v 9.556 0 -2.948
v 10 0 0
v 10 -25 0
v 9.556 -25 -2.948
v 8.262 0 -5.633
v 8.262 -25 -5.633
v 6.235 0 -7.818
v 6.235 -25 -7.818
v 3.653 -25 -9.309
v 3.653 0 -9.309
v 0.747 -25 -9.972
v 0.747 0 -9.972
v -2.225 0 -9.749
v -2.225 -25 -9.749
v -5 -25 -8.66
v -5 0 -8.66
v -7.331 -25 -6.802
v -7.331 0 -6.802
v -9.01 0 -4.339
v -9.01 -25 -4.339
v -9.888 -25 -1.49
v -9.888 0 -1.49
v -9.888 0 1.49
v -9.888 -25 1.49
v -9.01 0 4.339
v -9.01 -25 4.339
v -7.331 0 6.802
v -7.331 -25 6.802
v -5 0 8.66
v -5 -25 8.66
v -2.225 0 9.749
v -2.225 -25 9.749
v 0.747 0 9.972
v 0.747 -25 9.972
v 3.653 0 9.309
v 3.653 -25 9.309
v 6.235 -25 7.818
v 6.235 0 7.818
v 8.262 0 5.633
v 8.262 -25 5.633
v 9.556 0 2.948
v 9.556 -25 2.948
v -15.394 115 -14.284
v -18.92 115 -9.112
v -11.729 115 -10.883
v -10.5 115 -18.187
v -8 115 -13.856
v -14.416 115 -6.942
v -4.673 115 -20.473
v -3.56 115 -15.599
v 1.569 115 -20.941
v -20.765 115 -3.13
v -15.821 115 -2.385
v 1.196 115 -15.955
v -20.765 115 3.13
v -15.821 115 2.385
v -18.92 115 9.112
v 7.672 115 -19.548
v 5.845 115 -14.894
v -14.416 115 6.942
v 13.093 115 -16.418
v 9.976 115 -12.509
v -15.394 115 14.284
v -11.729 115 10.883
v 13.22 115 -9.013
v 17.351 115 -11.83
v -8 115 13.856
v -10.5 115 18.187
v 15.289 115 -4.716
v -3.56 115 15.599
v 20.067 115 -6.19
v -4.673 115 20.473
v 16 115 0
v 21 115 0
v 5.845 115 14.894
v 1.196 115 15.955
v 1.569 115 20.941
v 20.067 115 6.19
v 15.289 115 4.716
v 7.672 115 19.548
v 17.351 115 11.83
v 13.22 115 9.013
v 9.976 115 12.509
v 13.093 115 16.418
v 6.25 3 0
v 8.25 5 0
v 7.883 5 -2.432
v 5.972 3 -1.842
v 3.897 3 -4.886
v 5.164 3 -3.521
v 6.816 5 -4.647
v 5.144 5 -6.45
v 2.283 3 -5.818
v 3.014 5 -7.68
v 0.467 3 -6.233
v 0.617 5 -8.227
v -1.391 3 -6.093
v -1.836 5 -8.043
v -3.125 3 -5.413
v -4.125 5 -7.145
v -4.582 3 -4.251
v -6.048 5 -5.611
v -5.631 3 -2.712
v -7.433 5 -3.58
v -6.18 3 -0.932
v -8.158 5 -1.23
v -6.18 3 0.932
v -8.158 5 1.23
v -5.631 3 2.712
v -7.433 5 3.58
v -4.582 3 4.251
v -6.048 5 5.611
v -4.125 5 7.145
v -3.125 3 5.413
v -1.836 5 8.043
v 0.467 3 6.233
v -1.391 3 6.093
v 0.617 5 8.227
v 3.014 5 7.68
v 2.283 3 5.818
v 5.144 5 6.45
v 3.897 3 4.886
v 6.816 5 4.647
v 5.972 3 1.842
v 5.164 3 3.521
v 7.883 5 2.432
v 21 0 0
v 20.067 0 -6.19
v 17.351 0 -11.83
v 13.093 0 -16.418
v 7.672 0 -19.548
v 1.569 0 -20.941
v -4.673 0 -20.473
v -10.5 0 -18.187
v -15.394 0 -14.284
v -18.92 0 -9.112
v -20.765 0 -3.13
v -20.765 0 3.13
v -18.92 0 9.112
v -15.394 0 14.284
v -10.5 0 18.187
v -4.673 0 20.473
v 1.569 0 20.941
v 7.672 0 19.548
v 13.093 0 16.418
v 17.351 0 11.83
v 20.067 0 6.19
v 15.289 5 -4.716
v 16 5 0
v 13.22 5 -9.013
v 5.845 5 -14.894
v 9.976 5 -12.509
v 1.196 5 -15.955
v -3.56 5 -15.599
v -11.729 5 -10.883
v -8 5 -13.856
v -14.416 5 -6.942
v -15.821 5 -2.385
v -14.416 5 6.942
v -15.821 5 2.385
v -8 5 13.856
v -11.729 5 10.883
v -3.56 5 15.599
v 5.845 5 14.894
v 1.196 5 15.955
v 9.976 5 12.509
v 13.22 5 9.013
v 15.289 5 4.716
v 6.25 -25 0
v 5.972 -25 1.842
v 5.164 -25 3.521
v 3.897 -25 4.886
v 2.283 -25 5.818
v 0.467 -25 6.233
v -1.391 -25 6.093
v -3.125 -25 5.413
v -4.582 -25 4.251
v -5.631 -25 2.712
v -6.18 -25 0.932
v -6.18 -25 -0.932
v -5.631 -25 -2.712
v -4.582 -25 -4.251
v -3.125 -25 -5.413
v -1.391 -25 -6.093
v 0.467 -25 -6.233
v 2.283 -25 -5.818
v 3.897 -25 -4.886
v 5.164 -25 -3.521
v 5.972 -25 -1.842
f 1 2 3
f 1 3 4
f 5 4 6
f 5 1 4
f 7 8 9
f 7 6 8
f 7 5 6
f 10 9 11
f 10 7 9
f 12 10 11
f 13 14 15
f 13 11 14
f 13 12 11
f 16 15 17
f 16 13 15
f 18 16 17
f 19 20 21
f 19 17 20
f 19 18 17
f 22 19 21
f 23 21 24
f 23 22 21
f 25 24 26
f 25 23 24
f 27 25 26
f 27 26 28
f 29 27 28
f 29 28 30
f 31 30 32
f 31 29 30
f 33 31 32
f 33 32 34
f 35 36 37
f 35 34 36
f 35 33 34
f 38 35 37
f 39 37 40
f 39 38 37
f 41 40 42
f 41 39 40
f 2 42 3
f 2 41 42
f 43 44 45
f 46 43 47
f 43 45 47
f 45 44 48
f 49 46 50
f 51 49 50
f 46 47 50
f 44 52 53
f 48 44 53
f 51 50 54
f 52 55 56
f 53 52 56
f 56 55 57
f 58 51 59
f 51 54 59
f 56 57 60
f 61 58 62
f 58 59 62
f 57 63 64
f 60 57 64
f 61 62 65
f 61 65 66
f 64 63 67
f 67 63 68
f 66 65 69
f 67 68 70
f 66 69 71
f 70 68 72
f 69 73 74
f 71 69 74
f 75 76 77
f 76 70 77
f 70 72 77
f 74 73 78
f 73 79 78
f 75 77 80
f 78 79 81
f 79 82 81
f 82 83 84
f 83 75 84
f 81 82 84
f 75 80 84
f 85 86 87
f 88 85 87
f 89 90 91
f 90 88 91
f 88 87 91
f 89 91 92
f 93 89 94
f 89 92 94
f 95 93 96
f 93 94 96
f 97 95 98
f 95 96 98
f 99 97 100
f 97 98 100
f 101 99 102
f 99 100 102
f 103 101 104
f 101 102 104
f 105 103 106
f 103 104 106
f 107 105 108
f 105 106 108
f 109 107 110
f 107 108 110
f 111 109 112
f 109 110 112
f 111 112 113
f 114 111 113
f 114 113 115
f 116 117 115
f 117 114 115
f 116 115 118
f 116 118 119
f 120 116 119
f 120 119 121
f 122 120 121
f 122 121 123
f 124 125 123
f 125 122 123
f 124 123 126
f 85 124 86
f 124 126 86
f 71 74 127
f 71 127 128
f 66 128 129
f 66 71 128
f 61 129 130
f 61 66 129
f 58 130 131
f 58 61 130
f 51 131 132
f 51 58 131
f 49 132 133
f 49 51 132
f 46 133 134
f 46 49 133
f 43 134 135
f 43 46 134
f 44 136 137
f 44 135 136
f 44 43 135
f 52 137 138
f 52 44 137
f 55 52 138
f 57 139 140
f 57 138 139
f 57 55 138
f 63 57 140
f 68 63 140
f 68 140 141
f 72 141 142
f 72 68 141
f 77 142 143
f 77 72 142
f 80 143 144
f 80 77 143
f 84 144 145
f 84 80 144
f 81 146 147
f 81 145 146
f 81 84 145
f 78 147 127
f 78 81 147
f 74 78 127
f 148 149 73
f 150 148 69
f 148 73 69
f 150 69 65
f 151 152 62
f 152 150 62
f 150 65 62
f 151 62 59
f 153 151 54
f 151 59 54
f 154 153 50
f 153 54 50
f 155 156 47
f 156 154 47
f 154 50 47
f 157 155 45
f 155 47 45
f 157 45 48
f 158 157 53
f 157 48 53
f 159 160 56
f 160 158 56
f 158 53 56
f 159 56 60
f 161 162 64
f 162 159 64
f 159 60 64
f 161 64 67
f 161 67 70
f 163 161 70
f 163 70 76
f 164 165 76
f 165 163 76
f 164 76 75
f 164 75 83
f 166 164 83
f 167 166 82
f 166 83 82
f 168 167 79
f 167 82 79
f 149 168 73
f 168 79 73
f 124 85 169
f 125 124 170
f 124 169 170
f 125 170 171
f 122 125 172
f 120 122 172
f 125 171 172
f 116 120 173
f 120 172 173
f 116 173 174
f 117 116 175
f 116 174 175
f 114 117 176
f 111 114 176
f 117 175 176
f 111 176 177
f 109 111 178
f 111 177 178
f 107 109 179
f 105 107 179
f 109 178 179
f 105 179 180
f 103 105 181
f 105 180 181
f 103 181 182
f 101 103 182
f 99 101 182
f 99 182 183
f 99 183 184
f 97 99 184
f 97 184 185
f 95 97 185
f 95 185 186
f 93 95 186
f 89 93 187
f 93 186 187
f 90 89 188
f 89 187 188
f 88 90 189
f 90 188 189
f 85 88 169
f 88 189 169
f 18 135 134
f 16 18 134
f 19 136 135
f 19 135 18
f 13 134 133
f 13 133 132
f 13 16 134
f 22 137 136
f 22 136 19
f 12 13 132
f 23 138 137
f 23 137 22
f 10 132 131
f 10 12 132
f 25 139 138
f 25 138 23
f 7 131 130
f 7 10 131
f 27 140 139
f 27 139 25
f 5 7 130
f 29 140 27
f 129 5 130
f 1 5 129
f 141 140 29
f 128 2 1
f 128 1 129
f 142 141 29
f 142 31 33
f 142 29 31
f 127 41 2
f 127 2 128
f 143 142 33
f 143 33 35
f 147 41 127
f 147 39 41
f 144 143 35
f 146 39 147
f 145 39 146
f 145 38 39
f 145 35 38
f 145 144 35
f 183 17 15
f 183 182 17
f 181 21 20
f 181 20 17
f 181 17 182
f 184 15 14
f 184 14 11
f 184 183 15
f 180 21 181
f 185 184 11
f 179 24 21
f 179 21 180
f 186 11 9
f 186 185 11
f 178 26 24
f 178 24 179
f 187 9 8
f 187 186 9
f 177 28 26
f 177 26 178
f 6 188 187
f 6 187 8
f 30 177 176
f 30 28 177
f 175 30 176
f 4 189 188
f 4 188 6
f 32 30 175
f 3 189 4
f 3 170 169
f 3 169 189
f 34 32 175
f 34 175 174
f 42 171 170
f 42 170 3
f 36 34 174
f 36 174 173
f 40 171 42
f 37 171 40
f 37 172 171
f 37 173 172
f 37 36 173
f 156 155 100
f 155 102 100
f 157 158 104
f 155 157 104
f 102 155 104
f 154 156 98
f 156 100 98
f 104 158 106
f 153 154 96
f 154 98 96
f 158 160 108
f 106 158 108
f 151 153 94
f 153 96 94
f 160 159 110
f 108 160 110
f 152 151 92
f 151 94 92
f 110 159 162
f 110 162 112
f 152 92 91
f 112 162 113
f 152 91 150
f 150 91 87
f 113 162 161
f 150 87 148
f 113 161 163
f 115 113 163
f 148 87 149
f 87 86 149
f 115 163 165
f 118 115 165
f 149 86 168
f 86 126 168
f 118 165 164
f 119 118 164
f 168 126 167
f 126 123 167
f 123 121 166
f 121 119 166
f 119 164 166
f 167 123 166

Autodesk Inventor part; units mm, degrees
ref_plane "YZ Plane" through (0, 0, 0) normal (1, 0, 0) x (0, 1, 0)
ref_plane "XZ Plane" through (0, 0, 0) normal (0, 1, 0) x (-1, 0, 0)
ref_plane "XY Plane" through (0, 0, 0) normal (0, 0, 1) x (1, 0, 0)
sketch "Sketch1" plane through (0, 0, 0) normal (0, 0, 1) x (1, 0, 0)
  line L0 (0, 0) -> (0, -25) construction
  line L1 (6.25, 3) -> (6.25, -25)
  line L2 (6.25, -25) -> (10, -25)
  line L3 (10, -25) -> (10, 0)
  line L4 (0, 0) -> (6.25, 0) construction
  line L5 (10, 0) -> (21, 0)
  line L6 (21, 0) -> (21, 115)
  line L7 (8.25, 5) -> (16, 5)
  line L8 (16, 5) -> (16, 115)
  line L9 (21, 115) -> (16, 115)
  line L10 (0, 0) -> (0, 121) construction
  line L11 (6.25, 3) -> (8.25, 5)
  point P0 (6.25, 5)
  point P1 (3.125, 0)
  dimension "d0" = 12.5
  dimension "d1" = 20
  dimension "d2" = 25
  dimension "d6" = 115
  dimension "d8" = 5
  dimension "d9" = 5
  dimension "d11" = 32
  dimension "d16" = 2
  dimension "d17" = 2
revolve "Revolution1" add sketch "Sketch1" angle 360 about axis through (0, 0, 0) along (0, -1, 0)
thread "Thread1" size "M20x2.5" class "6g" standard "ANSI Metric M Profile" full length
thread "Thread3" size "M32x2" class "6H" standard "ANSI Metric M Profile" length 10
equation "\"d17\" = d16"
properties part number "Lagertopf"
